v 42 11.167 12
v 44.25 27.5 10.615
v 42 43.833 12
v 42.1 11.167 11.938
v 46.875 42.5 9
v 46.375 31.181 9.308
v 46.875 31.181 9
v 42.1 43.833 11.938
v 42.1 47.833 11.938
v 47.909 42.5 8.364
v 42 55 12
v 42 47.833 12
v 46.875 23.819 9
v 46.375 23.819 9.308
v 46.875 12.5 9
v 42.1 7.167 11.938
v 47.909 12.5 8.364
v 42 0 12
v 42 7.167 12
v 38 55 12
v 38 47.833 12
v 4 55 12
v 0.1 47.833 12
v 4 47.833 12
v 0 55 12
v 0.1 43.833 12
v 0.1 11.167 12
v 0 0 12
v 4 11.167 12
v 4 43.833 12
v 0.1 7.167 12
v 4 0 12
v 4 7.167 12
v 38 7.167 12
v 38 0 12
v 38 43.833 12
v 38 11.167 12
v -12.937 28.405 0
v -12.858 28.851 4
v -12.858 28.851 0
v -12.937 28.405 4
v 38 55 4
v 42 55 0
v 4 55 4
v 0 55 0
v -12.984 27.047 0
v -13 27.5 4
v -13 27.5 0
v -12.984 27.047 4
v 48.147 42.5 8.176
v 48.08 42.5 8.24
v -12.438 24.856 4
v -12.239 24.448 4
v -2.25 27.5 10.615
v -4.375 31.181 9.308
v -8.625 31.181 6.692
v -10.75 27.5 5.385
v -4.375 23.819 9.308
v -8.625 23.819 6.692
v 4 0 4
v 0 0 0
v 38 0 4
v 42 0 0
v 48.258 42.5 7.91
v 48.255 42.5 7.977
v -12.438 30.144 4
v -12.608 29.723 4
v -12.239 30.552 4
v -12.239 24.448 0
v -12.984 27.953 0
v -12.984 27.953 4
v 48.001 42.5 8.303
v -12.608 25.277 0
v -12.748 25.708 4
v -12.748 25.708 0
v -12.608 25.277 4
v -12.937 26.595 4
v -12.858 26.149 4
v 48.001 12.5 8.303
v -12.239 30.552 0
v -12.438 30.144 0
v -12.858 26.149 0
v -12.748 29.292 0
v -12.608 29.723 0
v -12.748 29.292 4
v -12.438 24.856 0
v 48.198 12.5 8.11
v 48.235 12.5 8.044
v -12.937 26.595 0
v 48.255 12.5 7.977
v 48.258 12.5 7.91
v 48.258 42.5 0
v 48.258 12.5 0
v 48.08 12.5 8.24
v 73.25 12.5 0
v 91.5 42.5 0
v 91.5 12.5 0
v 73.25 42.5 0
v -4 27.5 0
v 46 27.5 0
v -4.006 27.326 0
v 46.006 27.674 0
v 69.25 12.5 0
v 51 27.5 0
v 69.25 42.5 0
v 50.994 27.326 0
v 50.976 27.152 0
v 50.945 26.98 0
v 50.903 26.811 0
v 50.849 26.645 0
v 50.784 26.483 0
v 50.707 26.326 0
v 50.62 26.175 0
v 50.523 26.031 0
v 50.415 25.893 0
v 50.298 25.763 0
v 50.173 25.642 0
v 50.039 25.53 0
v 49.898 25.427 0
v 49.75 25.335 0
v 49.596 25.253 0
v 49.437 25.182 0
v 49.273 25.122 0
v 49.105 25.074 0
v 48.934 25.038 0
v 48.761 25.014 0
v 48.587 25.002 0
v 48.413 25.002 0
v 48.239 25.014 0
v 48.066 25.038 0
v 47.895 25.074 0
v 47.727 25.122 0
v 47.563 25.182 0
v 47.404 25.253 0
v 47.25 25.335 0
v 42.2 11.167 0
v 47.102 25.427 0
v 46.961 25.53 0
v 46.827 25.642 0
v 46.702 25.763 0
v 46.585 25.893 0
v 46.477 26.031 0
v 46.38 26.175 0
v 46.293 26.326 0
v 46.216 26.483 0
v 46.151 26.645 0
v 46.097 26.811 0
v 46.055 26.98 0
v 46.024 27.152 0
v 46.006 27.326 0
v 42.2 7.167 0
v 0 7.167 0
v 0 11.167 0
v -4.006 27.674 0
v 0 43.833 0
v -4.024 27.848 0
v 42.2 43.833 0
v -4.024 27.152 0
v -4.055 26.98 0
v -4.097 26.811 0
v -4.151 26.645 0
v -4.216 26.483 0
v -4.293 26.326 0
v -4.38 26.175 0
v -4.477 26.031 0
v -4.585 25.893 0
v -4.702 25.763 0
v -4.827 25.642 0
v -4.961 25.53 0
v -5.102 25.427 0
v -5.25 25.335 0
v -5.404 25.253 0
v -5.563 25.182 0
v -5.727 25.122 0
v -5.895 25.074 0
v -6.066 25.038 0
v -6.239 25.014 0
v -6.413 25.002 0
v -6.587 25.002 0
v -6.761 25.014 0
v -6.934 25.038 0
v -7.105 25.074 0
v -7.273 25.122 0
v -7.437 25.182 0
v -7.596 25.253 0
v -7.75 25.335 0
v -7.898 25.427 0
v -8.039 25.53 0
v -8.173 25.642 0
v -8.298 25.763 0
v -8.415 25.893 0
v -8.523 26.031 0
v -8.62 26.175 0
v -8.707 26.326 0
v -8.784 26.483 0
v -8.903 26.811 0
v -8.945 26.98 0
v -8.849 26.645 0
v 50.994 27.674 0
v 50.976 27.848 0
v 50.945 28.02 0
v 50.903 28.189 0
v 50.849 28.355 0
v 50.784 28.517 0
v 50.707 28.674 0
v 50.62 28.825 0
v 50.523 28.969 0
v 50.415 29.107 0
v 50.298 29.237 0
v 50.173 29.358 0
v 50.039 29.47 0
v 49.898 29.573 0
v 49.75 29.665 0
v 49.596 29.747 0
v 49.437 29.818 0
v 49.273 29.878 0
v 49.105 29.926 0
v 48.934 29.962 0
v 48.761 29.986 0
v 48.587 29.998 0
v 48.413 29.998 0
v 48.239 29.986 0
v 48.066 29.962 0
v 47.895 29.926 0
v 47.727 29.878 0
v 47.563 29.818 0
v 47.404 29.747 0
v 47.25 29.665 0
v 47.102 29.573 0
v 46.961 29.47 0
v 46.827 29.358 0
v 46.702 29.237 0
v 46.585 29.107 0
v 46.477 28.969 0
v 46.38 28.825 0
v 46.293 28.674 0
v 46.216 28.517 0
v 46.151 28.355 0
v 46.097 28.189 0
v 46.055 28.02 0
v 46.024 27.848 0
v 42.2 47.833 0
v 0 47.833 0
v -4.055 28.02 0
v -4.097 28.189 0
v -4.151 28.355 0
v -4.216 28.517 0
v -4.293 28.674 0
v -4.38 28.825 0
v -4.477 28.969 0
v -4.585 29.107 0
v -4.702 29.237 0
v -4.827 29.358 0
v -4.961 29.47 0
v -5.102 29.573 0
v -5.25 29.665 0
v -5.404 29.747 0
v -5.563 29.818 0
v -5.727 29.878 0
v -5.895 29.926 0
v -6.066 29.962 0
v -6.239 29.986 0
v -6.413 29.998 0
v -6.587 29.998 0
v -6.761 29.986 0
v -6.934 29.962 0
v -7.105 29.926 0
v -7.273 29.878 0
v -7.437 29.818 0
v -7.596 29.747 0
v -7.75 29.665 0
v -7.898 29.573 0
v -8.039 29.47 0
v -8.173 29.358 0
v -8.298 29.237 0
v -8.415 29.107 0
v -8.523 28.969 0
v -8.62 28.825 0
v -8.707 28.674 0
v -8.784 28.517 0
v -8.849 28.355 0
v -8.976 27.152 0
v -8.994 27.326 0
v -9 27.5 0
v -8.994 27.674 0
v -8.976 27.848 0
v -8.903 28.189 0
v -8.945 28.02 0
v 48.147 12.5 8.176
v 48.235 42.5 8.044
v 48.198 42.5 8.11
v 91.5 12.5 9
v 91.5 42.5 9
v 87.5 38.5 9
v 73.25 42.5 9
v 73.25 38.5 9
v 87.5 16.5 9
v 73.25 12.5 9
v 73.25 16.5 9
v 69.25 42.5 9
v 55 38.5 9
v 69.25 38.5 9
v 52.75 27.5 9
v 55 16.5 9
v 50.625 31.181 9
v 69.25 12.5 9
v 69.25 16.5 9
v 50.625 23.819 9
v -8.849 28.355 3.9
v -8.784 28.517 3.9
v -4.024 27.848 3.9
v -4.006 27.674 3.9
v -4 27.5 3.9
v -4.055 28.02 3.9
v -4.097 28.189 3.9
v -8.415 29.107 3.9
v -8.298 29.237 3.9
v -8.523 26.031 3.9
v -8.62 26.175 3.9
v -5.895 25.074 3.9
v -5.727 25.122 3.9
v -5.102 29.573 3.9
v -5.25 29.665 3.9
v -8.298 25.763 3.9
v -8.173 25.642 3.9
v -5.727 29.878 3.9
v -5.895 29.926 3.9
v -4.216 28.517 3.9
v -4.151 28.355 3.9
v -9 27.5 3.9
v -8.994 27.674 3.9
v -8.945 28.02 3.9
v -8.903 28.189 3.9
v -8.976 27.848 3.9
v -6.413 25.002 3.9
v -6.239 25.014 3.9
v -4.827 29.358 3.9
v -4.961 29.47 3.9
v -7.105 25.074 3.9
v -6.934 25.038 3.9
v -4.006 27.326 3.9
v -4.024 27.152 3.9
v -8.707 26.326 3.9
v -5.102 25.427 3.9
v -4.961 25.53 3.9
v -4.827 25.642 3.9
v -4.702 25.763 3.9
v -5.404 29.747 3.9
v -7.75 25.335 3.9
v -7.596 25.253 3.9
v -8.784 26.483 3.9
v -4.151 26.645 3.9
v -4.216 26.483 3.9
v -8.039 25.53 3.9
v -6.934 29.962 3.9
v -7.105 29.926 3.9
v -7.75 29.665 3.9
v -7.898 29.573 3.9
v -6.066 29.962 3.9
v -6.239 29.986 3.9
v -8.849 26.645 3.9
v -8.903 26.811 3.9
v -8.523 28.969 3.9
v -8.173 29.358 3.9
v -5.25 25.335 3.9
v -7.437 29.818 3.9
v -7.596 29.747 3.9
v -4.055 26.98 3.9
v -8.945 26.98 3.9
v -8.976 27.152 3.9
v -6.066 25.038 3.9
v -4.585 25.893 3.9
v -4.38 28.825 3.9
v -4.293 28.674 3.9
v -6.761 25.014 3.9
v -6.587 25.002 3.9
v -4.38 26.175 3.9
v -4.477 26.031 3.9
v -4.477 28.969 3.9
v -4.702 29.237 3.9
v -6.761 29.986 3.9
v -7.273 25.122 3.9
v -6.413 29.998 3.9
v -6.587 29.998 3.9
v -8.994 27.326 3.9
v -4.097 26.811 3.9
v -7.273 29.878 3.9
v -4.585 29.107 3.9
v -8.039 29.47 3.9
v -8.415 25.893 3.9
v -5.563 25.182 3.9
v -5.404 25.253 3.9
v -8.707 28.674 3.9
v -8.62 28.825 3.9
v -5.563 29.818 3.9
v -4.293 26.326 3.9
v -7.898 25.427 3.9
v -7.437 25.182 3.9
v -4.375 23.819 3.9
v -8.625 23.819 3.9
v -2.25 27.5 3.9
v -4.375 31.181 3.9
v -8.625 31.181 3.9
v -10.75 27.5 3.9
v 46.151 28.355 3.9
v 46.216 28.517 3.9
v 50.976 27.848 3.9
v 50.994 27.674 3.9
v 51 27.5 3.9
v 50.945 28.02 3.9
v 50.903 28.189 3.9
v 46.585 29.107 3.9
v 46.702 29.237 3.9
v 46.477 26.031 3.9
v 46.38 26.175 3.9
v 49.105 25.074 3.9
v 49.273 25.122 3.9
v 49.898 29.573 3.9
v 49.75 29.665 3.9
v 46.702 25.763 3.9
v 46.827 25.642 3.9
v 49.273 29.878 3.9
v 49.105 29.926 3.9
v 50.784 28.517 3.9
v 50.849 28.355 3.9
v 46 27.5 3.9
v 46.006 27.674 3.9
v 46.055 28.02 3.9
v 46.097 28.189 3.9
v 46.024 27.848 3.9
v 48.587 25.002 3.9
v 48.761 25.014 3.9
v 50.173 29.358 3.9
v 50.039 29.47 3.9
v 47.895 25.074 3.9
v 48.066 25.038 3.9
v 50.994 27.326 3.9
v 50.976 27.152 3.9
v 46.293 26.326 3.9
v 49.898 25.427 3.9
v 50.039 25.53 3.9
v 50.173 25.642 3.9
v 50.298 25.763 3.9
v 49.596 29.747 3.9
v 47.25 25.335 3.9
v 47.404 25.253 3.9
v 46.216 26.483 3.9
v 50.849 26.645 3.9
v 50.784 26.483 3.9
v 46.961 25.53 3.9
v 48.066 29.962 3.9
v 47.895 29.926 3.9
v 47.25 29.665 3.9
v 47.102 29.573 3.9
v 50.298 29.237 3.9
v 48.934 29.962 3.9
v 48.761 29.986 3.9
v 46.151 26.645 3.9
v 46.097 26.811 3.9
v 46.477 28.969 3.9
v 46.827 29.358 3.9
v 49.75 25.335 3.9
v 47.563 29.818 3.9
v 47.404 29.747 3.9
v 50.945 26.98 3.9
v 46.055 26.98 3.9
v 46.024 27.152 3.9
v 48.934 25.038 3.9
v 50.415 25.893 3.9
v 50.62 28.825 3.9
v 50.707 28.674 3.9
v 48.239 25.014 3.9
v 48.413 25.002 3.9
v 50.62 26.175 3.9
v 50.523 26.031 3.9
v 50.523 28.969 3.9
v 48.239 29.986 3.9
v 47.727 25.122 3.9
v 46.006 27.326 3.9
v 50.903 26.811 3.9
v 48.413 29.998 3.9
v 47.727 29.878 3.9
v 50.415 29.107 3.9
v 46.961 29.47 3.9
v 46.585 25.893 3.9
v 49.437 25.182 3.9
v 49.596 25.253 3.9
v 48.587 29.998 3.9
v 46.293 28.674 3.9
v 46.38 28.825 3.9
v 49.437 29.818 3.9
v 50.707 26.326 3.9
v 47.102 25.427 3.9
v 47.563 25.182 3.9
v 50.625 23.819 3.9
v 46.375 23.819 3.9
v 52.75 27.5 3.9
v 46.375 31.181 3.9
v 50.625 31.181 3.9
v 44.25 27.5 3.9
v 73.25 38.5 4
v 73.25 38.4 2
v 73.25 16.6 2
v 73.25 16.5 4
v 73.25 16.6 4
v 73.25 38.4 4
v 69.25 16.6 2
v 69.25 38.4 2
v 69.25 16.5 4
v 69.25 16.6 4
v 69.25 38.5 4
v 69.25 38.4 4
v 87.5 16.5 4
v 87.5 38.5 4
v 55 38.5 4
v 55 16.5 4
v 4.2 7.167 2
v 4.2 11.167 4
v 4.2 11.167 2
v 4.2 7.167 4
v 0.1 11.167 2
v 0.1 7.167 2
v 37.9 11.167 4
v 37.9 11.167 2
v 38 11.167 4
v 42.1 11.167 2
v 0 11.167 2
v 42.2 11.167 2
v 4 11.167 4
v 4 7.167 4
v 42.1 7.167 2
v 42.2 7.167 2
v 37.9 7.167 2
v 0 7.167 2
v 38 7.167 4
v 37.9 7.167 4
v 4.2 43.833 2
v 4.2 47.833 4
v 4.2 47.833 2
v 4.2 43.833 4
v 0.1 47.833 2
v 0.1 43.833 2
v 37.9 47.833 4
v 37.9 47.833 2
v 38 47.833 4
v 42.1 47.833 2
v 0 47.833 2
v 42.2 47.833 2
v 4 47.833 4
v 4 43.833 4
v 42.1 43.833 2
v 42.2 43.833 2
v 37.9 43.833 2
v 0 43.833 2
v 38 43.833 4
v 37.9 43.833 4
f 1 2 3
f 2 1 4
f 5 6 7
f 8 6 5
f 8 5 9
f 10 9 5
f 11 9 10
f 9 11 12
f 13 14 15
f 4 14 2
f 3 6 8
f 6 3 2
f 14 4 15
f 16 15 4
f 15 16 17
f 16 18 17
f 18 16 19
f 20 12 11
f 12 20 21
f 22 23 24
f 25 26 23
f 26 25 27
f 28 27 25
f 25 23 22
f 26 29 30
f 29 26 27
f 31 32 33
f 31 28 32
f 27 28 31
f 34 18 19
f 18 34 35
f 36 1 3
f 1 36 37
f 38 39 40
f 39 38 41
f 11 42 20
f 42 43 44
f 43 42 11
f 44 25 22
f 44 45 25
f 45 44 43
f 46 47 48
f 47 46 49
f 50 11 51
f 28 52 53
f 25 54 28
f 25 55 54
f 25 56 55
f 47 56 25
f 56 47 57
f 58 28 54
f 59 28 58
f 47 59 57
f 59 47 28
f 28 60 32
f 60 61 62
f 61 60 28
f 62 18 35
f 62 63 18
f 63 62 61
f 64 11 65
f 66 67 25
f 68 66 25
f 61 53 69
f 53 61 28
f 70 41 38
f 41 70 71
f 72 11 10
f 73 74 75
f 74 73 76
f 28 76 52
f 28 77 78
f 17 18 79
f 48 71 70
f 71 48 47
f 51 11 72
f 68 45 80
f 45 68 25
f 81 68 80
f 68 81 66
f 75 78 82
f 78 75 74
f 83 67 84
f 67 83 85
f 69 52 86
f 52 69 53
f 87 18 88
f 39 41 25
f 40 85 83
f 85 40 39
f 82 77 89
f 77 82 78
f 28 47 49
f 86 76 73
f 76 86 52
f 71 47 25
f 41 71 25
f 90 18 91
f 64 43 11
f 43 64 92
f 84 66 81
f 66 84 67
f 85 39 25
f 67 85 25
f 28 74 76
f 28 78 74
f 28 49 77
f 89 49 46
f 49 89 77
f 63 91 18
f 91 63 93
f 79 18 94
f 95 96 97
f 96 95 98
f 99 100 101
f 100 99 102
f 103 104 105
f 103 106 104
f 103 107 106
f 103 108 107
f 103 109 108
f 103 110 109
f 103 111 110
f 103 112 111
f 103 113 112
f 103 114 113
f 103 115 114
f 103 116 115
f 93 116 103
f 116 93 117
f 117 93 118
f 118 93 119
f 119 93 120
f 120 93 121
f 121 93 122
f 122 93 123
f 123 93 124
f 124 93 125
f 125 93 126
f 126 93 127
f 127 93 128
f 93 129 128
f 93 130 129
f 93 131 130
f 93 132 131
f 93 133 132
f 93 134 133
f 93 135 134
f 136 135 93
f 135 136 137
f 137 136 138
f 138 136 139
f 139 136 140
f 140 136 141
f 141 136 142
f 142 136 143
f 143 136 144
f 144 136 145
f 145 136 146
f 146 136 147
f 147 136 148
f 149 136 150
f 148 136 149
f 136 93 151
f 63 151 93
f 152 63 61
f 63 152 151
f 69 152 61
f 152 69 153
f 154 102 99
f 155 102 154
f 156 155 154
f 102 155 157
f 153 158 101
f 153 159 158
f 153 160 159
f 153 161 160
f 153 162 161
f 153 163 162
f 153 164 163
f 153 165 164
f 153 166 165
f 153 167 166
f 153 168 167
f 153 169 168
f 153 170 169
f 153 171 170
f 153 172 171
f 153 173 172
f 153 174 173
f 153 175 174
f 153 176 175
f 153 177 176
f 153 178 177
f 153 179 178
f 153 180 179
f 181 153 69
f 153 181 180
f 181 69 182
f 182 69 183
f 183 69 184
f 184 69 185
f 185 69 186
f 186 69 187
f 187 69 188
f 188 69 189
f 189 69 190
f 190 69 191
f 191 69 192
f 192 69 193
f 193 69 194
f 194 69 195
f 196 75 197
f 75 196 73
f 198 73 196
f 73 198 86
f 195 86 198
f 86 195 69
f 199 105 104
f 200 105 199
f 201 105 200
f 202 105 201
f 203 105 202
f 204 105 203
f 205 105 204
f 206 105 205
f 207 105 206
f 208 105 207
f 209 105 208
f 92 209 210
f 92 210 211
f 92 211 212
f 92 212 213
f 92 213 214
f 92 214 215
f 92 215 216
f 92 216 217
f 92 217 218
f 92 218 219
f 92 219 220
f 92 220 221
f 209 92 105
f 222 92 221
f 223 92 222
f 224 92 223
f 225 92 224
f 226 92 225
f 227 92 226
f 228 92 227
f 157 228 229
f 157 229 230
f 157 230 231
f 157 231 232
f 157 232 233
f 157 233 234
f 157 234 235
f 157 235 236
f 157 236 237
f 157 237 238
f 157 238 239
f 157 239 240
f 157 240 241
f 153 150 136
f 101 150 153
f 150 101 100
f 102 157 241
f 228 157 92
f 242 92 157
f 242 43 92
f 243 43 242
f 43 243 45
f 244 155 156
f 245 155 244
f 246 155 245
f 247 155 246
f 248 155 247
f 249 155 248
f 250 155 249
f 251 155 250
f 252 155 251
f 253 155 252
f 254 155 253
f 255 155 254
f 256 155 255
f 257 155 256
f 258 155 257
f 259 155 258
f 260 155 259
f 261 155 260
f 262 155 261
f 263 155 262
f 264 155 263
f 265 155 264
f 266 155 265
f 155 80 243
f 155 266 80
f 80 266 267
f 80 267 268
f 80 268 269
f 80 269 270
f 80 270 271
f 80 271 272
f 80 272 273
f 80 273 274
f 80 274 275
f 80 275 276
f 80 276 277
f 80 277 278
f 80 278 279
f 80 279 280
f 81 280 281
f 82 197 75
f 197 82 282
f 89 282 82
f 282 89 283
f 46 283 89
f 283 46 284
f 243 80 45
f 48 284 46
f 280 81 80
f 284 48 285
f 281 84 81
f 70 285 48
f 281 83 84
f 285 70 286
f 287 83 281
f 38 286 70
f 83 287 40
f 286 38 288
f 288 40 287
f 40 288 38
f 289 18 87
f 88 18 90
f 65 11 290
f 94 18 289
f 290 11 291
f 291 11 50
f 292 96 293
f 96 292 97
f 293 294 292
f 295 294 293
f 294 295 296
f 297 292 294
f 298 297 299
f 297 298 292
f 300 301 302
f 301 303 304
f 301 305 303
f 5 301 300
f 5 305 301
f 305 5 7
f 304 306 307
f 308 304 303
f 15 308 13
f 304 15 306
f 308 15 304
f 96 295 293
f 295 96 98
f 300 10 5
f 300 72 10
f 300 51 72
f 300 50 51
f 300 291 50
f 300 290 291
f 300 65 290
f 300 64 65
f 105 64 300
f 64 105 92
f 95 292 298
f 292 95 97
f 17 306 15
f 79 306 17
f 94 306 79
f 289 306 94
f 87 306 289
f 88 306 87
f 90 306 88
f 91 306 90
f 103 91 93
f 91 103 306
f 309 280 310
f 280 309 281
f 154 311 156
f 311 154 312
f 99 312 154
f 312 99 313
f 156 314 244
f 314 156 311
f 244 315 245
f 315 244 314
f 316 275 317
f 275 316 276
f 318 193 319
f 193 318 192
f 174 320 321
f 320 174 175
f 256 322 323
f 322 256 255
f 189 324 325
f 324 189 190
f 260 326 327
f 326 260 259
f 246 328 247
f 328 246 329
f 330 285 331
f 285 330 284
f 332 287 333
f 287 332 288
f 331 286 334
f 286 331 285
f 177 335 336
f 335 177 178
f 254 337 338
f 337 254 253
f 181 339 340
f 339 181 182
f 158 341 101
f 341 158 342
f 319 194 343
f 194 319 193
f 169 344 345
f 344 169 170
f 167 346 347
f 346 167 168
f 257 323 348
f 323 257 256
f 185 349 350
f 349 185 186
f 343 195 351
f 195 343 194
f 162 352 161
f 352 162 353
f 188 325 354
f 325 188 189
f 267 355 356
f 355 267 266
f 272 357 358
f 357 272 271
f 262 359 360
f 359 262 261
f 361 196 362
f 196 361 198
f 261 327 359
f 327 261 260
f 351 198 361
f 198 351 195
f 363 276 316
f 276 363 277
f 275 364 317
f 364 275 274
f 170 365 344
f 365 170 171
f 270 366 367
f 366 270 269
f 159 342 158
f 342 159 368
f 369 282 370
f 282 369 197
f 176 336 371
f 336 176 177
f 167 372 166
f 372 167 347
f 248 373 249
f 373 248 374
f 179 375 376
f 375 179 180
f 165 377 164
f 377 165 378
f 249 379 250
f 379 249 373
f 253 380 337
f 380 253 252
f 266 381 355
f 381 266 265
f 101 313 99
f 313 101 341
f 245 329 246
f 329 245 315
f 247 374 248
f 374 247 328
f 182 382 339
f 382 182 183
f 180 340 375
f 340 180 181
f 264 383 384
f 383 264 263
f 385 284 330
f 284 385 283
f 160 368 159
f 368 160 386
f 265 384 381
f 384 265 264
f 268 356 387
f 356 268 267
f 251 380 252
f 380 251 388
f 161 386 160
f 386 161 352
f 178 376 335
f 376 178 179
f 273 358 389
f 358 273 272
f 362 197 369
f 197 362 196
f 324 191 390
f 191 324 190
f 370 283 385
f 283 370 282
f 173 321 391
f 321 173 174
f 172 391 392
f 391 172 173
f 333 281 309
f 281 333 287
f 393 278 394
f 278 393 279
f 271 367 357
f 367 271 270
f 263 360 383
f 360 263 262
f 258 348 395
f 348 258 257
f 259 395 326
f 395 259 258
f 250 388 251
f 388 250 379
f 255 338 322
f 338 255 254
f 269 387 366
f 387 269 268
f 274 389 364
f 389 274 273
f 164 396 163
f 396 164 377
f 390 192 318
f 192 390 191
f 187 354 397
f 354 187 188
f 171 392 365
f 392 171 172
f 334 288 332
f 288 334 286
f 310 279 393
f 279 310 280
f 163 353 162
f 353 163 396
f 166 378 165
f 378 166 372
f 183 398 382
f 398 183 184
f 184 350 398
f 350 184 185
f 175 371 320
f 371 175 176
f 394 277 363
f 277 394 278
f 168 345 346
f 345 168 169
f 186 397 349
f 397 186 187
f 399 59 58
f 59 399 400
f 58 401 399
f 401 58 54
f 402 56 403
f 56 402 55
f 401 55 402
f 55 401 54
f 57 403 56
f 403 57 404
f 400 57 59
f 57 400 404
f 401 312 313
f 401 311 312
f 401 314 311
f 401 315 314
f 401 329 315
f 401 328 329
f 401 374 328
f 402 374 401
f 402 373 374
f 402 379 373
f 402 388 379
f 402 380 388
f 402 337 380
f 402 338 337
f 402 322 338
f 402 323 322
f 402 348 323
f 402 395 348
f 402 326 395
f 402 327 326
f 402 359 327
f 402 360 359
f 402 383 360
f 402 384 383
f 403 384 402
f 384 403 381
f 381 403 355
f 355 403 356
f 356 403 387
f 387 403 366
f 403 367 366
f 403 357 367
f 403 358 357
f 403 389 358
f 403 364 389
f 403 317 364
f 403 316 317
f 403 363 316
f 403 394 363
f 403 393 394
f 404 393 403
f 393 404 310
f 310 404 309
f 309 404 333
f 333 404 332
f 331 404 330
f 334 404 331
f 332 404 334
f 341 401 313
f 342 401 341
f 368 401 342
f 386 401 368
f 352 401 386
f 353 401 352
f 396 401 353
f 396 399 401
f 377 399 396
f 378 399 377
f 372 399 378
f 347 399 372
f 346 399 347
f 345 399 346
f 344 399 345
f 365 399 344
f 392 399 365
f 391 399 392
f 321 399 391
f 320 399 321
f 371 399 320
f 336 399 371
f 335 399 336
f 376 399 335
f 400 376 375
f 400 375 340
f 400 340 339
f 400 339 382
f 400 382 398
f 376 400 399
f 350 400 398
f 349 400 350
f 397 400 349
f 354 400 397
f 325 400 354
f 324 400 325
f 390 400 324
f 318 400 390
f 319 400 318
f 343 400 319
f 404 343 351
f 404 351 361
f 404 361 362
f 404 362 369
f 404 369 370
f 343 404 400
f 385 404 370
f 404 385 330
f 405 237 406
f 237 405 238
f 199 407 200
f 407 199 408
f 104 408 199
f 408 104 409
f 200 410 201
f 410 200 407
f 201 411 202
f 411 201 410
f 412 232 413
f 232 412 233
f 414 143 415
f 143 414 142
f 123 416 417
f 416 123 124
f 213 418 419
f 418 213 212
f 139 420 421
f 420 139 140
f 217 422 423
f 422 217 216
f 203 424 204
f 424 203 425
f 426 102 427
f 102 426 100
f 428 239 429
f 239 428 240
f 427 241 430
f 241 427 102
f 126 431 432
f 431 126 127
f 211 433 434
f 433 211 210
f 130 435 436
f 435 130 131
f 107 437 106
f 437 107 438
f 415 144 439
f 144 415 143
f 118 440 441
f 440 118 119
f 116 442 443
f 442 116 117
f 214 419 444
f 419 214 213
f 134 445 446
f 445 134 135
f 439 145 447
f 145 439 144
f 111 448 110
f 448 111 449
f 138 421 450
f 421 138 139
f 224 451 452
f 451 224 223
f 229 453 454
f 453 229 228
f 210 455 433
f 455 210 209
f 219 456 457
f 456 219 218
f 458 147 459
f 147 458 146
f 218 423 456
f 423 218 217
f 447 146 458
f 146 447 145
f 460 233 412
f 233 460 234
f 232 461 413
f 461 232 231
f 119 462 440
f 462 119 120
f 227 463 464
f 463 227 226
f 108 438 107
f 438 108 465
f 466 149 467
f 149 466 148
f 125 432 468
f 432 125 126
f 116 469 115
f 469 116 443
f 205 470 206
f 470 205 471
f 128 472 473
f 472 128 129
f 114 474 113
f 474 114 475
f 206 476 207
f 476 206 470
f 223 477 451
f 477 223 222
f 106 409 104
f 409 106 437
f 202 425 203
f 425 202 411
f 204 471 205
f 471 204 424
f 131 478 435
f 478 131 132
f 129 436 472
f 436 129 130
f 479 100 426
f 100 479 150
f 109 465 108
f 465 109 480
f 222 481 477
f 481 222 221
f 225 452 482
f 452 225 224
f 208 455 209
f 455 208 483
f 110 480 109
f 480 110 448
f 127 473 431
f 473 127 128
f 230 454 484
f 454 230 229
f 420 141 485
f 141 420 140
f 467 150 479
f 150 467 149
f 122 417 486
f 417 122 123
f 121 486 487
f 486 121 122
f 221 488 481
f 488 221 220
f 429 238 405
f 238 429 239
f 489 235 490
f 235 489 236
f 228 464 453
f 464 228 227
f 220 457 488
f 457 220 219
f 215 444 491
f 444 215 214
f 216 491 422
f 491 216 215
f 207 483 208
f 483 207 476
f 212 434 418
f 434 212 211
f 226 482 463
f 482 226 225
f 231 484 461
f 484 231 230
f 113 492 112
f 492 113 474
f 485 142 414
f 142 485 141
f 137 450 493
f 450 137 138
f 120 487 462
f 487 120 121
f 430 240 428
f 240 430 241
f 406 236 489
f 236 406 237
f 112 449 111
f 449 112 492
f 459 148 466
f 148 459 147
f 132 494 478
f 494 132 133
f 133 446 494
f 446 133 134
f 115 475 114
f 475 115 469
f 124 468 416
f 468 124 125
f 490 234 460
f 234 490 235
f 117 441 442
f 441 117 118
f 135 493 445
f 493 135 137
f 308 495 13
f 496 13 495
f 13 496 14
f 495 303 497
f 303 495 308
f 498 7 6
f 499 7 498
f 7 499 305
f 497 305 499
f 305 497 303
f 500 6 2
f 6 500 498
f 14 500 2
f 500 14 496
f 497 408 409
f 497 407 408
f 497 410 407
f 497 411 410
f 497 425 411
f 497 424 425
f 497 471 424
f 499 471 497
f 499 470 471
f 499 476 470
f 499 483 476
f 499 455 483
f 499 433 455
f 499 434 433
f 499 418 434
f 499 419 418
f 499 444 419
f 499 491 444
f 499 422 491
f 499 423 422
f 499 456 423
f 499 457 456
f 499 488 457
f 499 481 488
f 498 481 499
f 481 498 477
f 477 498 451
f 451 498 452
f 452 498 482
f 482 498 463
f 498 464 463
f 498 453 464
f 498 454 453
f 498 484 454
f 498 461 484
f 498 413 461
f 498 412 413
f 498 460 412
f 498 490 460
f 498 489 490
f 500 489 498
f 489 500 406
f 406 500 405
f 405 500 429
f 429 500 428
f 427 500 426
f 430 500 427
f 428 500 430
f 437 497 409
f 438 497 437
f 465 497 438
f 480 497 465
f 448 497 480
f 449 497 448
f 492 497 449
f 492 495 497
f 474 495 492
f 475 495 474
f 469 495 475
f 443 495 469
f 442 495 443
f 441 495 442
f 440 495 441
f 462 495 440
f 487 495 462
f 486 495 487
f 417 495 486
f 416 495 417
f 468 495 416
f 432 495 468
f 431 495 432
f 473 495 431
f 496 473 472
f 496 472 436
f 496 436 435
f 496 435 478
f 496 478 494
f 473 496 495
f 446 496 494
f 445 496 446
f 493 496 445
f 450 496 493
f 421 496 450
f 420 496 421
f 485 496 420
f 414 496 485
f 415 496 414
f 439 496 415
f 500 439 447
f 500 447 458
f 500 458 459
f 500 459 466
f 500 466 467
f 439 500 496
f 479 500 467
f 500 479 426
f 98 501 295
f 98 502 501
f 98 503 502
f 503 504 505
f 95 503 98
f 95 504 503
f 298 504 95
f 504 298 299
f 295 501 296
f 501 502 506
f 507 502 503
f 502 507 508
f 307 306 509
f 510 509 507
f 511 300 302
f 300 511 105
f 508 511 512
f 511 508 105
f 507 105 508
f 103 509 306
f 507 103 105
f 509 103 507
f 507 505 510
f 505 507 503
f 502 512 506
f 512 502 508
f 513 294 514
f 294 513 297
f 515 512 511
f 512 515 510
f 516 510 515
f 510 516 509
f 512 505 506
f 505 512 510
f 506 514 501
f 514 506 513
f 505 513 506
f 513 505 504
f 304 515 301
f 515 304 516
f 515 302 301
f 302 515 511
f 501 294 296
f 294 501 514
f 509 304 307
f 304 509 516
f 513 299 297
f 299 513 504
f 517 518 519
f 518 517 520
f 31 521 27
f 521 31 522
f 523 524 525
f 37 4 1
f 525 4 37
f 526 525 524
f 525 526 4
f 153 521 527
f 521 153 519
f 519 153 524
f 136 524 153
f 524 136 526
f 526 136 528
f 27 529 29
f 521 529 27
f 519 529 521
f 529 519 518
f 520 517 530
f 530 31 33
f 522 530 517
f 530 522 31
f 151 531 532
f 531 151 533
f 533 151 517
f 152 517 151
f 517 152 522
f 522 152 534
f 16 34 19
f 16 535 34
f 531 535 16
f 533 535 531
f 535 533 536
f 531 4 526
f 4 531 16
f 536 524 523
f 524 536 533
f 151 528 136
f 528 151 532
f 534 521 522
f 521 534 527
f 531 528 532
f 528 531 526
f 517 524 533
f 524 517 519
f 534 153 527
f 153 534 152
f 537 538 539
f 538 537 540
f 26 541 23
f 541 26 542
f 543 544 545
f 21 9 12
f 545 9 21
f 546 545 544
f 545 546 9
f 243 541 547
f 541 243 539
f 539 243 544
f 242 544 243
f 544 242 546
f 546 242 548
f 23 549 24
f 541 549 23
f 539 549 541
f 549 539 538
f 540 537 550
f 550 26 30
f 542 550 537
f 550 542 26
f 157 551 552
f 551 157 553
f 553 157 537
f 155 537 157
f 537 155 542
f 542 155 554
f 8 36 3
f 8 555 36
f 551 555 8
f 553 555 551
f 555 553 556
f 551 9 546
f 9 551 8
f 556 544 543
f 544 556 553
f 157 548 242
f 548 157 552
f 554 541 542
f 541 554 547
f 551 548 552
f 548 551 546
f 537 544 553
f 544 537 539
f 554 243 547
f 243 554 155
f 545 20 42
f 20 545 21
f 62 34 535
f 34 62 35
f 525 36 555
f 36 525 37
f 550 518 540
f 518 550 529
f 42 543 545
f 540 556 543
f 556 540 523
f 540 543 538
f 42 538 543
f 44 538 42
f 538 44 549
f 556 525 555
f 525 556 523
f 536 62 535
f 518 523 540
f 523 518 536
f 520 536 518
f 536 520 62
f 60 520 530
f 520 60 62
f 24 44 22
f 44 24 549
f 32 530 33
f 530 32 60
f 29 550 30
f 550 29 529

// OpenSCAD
screw=5;
esc_x=34;
esc_y=55;
esc_z=8;
$fn=90;

rec_x=32.5;
rec_y=22;
rec_z=5;

wall=4;
walll=wall*2;

pad=0.1;
padd=pad*2;
screw_h=4;

zip_h=wall/2;
zip_w=4;

nut=8.5;

module esc_zip() {
    translate([0,-zip_w/2,0]) {
        translate([pad,0,-pad])
        cube([wall+pad,wall,wall+esc_z+padd]);
        translate([wall+esc_x-pad,0,-pad])
        cube([wall+padd,wall,wall+esc_z+padd]);
        translate([0,0,-pad])
        cube([esc_x+walll+padd,zip_w,zip_h+pad]);
    }
}


difference() {
    union() {
        hull() {
            cube([esc_x+walll,esc_y,esc_z+wall]);
            translate([-screw/2-wall,esc_y/2,0])
            cylinder(h=screw_h,d=screw+walll);
            translate([walll+esc_x+screw/2+wall,esc_y/2,0])
            cylinder(h=screw_h,d=screw+walll);
        }
        translate([wall*4+screw,esc_y/2-rec_y/2-wall,0])
        cube([rec_x+wall+esc_x,rec_y+walll,rec_z+wall]);
    }
    translate([wall,-pad,wall])
    cube([esc_x,esc_y+padd,esc_z+pad]);
    translate([-screw/2-wall,esc_y/2,-pad]) {
        cylinder(h=esc_z*2,d=screw);
        translate([0,0,screw_h])
        cylinder(h=esc_z*2,d=nut,$fn=6);
        //cylinder(h=esc_z+walll,d1=screw+walll,d2=screw+walll*2+esc_z*2);
    }
    translate([walll+esc_x+screw/2+wall,esc_y/2,-pad]) {
        cylinder(h=esc_z*2,d=screw);
        translate([0,0,screw_h])
        cylinder(h=esc_z*2,d=nut,$fn=6);
        //cylinder(h=esc_z+walll,d1=screw+walll,d2=screw+walll*2+esc_z*2);
    }
    translate([esc_x+wall*4+screw,esc_y/2-rec_y/2,wall]) {
        cube([rec_x,rec_y,rec_z+pad]);
        translate([rec_x/2-zip_w/2,-wall-pad,-wall-pad]) {
            cube([zip_w,rec_y+walll+padd,zip_h+pad]);
            cube([zip_w,wall+padd,rec_z+wall+padd]);
            translate([0,rec_y+wall,0])
            cube([zip_w,wall+padd,rec_z+wall+padd]);
        }
    }
    translate([0,esc_y/6,0])
    esc_zip();
    translate([0,esc_y-esc_y/6,0])
    esc_zip();
}
